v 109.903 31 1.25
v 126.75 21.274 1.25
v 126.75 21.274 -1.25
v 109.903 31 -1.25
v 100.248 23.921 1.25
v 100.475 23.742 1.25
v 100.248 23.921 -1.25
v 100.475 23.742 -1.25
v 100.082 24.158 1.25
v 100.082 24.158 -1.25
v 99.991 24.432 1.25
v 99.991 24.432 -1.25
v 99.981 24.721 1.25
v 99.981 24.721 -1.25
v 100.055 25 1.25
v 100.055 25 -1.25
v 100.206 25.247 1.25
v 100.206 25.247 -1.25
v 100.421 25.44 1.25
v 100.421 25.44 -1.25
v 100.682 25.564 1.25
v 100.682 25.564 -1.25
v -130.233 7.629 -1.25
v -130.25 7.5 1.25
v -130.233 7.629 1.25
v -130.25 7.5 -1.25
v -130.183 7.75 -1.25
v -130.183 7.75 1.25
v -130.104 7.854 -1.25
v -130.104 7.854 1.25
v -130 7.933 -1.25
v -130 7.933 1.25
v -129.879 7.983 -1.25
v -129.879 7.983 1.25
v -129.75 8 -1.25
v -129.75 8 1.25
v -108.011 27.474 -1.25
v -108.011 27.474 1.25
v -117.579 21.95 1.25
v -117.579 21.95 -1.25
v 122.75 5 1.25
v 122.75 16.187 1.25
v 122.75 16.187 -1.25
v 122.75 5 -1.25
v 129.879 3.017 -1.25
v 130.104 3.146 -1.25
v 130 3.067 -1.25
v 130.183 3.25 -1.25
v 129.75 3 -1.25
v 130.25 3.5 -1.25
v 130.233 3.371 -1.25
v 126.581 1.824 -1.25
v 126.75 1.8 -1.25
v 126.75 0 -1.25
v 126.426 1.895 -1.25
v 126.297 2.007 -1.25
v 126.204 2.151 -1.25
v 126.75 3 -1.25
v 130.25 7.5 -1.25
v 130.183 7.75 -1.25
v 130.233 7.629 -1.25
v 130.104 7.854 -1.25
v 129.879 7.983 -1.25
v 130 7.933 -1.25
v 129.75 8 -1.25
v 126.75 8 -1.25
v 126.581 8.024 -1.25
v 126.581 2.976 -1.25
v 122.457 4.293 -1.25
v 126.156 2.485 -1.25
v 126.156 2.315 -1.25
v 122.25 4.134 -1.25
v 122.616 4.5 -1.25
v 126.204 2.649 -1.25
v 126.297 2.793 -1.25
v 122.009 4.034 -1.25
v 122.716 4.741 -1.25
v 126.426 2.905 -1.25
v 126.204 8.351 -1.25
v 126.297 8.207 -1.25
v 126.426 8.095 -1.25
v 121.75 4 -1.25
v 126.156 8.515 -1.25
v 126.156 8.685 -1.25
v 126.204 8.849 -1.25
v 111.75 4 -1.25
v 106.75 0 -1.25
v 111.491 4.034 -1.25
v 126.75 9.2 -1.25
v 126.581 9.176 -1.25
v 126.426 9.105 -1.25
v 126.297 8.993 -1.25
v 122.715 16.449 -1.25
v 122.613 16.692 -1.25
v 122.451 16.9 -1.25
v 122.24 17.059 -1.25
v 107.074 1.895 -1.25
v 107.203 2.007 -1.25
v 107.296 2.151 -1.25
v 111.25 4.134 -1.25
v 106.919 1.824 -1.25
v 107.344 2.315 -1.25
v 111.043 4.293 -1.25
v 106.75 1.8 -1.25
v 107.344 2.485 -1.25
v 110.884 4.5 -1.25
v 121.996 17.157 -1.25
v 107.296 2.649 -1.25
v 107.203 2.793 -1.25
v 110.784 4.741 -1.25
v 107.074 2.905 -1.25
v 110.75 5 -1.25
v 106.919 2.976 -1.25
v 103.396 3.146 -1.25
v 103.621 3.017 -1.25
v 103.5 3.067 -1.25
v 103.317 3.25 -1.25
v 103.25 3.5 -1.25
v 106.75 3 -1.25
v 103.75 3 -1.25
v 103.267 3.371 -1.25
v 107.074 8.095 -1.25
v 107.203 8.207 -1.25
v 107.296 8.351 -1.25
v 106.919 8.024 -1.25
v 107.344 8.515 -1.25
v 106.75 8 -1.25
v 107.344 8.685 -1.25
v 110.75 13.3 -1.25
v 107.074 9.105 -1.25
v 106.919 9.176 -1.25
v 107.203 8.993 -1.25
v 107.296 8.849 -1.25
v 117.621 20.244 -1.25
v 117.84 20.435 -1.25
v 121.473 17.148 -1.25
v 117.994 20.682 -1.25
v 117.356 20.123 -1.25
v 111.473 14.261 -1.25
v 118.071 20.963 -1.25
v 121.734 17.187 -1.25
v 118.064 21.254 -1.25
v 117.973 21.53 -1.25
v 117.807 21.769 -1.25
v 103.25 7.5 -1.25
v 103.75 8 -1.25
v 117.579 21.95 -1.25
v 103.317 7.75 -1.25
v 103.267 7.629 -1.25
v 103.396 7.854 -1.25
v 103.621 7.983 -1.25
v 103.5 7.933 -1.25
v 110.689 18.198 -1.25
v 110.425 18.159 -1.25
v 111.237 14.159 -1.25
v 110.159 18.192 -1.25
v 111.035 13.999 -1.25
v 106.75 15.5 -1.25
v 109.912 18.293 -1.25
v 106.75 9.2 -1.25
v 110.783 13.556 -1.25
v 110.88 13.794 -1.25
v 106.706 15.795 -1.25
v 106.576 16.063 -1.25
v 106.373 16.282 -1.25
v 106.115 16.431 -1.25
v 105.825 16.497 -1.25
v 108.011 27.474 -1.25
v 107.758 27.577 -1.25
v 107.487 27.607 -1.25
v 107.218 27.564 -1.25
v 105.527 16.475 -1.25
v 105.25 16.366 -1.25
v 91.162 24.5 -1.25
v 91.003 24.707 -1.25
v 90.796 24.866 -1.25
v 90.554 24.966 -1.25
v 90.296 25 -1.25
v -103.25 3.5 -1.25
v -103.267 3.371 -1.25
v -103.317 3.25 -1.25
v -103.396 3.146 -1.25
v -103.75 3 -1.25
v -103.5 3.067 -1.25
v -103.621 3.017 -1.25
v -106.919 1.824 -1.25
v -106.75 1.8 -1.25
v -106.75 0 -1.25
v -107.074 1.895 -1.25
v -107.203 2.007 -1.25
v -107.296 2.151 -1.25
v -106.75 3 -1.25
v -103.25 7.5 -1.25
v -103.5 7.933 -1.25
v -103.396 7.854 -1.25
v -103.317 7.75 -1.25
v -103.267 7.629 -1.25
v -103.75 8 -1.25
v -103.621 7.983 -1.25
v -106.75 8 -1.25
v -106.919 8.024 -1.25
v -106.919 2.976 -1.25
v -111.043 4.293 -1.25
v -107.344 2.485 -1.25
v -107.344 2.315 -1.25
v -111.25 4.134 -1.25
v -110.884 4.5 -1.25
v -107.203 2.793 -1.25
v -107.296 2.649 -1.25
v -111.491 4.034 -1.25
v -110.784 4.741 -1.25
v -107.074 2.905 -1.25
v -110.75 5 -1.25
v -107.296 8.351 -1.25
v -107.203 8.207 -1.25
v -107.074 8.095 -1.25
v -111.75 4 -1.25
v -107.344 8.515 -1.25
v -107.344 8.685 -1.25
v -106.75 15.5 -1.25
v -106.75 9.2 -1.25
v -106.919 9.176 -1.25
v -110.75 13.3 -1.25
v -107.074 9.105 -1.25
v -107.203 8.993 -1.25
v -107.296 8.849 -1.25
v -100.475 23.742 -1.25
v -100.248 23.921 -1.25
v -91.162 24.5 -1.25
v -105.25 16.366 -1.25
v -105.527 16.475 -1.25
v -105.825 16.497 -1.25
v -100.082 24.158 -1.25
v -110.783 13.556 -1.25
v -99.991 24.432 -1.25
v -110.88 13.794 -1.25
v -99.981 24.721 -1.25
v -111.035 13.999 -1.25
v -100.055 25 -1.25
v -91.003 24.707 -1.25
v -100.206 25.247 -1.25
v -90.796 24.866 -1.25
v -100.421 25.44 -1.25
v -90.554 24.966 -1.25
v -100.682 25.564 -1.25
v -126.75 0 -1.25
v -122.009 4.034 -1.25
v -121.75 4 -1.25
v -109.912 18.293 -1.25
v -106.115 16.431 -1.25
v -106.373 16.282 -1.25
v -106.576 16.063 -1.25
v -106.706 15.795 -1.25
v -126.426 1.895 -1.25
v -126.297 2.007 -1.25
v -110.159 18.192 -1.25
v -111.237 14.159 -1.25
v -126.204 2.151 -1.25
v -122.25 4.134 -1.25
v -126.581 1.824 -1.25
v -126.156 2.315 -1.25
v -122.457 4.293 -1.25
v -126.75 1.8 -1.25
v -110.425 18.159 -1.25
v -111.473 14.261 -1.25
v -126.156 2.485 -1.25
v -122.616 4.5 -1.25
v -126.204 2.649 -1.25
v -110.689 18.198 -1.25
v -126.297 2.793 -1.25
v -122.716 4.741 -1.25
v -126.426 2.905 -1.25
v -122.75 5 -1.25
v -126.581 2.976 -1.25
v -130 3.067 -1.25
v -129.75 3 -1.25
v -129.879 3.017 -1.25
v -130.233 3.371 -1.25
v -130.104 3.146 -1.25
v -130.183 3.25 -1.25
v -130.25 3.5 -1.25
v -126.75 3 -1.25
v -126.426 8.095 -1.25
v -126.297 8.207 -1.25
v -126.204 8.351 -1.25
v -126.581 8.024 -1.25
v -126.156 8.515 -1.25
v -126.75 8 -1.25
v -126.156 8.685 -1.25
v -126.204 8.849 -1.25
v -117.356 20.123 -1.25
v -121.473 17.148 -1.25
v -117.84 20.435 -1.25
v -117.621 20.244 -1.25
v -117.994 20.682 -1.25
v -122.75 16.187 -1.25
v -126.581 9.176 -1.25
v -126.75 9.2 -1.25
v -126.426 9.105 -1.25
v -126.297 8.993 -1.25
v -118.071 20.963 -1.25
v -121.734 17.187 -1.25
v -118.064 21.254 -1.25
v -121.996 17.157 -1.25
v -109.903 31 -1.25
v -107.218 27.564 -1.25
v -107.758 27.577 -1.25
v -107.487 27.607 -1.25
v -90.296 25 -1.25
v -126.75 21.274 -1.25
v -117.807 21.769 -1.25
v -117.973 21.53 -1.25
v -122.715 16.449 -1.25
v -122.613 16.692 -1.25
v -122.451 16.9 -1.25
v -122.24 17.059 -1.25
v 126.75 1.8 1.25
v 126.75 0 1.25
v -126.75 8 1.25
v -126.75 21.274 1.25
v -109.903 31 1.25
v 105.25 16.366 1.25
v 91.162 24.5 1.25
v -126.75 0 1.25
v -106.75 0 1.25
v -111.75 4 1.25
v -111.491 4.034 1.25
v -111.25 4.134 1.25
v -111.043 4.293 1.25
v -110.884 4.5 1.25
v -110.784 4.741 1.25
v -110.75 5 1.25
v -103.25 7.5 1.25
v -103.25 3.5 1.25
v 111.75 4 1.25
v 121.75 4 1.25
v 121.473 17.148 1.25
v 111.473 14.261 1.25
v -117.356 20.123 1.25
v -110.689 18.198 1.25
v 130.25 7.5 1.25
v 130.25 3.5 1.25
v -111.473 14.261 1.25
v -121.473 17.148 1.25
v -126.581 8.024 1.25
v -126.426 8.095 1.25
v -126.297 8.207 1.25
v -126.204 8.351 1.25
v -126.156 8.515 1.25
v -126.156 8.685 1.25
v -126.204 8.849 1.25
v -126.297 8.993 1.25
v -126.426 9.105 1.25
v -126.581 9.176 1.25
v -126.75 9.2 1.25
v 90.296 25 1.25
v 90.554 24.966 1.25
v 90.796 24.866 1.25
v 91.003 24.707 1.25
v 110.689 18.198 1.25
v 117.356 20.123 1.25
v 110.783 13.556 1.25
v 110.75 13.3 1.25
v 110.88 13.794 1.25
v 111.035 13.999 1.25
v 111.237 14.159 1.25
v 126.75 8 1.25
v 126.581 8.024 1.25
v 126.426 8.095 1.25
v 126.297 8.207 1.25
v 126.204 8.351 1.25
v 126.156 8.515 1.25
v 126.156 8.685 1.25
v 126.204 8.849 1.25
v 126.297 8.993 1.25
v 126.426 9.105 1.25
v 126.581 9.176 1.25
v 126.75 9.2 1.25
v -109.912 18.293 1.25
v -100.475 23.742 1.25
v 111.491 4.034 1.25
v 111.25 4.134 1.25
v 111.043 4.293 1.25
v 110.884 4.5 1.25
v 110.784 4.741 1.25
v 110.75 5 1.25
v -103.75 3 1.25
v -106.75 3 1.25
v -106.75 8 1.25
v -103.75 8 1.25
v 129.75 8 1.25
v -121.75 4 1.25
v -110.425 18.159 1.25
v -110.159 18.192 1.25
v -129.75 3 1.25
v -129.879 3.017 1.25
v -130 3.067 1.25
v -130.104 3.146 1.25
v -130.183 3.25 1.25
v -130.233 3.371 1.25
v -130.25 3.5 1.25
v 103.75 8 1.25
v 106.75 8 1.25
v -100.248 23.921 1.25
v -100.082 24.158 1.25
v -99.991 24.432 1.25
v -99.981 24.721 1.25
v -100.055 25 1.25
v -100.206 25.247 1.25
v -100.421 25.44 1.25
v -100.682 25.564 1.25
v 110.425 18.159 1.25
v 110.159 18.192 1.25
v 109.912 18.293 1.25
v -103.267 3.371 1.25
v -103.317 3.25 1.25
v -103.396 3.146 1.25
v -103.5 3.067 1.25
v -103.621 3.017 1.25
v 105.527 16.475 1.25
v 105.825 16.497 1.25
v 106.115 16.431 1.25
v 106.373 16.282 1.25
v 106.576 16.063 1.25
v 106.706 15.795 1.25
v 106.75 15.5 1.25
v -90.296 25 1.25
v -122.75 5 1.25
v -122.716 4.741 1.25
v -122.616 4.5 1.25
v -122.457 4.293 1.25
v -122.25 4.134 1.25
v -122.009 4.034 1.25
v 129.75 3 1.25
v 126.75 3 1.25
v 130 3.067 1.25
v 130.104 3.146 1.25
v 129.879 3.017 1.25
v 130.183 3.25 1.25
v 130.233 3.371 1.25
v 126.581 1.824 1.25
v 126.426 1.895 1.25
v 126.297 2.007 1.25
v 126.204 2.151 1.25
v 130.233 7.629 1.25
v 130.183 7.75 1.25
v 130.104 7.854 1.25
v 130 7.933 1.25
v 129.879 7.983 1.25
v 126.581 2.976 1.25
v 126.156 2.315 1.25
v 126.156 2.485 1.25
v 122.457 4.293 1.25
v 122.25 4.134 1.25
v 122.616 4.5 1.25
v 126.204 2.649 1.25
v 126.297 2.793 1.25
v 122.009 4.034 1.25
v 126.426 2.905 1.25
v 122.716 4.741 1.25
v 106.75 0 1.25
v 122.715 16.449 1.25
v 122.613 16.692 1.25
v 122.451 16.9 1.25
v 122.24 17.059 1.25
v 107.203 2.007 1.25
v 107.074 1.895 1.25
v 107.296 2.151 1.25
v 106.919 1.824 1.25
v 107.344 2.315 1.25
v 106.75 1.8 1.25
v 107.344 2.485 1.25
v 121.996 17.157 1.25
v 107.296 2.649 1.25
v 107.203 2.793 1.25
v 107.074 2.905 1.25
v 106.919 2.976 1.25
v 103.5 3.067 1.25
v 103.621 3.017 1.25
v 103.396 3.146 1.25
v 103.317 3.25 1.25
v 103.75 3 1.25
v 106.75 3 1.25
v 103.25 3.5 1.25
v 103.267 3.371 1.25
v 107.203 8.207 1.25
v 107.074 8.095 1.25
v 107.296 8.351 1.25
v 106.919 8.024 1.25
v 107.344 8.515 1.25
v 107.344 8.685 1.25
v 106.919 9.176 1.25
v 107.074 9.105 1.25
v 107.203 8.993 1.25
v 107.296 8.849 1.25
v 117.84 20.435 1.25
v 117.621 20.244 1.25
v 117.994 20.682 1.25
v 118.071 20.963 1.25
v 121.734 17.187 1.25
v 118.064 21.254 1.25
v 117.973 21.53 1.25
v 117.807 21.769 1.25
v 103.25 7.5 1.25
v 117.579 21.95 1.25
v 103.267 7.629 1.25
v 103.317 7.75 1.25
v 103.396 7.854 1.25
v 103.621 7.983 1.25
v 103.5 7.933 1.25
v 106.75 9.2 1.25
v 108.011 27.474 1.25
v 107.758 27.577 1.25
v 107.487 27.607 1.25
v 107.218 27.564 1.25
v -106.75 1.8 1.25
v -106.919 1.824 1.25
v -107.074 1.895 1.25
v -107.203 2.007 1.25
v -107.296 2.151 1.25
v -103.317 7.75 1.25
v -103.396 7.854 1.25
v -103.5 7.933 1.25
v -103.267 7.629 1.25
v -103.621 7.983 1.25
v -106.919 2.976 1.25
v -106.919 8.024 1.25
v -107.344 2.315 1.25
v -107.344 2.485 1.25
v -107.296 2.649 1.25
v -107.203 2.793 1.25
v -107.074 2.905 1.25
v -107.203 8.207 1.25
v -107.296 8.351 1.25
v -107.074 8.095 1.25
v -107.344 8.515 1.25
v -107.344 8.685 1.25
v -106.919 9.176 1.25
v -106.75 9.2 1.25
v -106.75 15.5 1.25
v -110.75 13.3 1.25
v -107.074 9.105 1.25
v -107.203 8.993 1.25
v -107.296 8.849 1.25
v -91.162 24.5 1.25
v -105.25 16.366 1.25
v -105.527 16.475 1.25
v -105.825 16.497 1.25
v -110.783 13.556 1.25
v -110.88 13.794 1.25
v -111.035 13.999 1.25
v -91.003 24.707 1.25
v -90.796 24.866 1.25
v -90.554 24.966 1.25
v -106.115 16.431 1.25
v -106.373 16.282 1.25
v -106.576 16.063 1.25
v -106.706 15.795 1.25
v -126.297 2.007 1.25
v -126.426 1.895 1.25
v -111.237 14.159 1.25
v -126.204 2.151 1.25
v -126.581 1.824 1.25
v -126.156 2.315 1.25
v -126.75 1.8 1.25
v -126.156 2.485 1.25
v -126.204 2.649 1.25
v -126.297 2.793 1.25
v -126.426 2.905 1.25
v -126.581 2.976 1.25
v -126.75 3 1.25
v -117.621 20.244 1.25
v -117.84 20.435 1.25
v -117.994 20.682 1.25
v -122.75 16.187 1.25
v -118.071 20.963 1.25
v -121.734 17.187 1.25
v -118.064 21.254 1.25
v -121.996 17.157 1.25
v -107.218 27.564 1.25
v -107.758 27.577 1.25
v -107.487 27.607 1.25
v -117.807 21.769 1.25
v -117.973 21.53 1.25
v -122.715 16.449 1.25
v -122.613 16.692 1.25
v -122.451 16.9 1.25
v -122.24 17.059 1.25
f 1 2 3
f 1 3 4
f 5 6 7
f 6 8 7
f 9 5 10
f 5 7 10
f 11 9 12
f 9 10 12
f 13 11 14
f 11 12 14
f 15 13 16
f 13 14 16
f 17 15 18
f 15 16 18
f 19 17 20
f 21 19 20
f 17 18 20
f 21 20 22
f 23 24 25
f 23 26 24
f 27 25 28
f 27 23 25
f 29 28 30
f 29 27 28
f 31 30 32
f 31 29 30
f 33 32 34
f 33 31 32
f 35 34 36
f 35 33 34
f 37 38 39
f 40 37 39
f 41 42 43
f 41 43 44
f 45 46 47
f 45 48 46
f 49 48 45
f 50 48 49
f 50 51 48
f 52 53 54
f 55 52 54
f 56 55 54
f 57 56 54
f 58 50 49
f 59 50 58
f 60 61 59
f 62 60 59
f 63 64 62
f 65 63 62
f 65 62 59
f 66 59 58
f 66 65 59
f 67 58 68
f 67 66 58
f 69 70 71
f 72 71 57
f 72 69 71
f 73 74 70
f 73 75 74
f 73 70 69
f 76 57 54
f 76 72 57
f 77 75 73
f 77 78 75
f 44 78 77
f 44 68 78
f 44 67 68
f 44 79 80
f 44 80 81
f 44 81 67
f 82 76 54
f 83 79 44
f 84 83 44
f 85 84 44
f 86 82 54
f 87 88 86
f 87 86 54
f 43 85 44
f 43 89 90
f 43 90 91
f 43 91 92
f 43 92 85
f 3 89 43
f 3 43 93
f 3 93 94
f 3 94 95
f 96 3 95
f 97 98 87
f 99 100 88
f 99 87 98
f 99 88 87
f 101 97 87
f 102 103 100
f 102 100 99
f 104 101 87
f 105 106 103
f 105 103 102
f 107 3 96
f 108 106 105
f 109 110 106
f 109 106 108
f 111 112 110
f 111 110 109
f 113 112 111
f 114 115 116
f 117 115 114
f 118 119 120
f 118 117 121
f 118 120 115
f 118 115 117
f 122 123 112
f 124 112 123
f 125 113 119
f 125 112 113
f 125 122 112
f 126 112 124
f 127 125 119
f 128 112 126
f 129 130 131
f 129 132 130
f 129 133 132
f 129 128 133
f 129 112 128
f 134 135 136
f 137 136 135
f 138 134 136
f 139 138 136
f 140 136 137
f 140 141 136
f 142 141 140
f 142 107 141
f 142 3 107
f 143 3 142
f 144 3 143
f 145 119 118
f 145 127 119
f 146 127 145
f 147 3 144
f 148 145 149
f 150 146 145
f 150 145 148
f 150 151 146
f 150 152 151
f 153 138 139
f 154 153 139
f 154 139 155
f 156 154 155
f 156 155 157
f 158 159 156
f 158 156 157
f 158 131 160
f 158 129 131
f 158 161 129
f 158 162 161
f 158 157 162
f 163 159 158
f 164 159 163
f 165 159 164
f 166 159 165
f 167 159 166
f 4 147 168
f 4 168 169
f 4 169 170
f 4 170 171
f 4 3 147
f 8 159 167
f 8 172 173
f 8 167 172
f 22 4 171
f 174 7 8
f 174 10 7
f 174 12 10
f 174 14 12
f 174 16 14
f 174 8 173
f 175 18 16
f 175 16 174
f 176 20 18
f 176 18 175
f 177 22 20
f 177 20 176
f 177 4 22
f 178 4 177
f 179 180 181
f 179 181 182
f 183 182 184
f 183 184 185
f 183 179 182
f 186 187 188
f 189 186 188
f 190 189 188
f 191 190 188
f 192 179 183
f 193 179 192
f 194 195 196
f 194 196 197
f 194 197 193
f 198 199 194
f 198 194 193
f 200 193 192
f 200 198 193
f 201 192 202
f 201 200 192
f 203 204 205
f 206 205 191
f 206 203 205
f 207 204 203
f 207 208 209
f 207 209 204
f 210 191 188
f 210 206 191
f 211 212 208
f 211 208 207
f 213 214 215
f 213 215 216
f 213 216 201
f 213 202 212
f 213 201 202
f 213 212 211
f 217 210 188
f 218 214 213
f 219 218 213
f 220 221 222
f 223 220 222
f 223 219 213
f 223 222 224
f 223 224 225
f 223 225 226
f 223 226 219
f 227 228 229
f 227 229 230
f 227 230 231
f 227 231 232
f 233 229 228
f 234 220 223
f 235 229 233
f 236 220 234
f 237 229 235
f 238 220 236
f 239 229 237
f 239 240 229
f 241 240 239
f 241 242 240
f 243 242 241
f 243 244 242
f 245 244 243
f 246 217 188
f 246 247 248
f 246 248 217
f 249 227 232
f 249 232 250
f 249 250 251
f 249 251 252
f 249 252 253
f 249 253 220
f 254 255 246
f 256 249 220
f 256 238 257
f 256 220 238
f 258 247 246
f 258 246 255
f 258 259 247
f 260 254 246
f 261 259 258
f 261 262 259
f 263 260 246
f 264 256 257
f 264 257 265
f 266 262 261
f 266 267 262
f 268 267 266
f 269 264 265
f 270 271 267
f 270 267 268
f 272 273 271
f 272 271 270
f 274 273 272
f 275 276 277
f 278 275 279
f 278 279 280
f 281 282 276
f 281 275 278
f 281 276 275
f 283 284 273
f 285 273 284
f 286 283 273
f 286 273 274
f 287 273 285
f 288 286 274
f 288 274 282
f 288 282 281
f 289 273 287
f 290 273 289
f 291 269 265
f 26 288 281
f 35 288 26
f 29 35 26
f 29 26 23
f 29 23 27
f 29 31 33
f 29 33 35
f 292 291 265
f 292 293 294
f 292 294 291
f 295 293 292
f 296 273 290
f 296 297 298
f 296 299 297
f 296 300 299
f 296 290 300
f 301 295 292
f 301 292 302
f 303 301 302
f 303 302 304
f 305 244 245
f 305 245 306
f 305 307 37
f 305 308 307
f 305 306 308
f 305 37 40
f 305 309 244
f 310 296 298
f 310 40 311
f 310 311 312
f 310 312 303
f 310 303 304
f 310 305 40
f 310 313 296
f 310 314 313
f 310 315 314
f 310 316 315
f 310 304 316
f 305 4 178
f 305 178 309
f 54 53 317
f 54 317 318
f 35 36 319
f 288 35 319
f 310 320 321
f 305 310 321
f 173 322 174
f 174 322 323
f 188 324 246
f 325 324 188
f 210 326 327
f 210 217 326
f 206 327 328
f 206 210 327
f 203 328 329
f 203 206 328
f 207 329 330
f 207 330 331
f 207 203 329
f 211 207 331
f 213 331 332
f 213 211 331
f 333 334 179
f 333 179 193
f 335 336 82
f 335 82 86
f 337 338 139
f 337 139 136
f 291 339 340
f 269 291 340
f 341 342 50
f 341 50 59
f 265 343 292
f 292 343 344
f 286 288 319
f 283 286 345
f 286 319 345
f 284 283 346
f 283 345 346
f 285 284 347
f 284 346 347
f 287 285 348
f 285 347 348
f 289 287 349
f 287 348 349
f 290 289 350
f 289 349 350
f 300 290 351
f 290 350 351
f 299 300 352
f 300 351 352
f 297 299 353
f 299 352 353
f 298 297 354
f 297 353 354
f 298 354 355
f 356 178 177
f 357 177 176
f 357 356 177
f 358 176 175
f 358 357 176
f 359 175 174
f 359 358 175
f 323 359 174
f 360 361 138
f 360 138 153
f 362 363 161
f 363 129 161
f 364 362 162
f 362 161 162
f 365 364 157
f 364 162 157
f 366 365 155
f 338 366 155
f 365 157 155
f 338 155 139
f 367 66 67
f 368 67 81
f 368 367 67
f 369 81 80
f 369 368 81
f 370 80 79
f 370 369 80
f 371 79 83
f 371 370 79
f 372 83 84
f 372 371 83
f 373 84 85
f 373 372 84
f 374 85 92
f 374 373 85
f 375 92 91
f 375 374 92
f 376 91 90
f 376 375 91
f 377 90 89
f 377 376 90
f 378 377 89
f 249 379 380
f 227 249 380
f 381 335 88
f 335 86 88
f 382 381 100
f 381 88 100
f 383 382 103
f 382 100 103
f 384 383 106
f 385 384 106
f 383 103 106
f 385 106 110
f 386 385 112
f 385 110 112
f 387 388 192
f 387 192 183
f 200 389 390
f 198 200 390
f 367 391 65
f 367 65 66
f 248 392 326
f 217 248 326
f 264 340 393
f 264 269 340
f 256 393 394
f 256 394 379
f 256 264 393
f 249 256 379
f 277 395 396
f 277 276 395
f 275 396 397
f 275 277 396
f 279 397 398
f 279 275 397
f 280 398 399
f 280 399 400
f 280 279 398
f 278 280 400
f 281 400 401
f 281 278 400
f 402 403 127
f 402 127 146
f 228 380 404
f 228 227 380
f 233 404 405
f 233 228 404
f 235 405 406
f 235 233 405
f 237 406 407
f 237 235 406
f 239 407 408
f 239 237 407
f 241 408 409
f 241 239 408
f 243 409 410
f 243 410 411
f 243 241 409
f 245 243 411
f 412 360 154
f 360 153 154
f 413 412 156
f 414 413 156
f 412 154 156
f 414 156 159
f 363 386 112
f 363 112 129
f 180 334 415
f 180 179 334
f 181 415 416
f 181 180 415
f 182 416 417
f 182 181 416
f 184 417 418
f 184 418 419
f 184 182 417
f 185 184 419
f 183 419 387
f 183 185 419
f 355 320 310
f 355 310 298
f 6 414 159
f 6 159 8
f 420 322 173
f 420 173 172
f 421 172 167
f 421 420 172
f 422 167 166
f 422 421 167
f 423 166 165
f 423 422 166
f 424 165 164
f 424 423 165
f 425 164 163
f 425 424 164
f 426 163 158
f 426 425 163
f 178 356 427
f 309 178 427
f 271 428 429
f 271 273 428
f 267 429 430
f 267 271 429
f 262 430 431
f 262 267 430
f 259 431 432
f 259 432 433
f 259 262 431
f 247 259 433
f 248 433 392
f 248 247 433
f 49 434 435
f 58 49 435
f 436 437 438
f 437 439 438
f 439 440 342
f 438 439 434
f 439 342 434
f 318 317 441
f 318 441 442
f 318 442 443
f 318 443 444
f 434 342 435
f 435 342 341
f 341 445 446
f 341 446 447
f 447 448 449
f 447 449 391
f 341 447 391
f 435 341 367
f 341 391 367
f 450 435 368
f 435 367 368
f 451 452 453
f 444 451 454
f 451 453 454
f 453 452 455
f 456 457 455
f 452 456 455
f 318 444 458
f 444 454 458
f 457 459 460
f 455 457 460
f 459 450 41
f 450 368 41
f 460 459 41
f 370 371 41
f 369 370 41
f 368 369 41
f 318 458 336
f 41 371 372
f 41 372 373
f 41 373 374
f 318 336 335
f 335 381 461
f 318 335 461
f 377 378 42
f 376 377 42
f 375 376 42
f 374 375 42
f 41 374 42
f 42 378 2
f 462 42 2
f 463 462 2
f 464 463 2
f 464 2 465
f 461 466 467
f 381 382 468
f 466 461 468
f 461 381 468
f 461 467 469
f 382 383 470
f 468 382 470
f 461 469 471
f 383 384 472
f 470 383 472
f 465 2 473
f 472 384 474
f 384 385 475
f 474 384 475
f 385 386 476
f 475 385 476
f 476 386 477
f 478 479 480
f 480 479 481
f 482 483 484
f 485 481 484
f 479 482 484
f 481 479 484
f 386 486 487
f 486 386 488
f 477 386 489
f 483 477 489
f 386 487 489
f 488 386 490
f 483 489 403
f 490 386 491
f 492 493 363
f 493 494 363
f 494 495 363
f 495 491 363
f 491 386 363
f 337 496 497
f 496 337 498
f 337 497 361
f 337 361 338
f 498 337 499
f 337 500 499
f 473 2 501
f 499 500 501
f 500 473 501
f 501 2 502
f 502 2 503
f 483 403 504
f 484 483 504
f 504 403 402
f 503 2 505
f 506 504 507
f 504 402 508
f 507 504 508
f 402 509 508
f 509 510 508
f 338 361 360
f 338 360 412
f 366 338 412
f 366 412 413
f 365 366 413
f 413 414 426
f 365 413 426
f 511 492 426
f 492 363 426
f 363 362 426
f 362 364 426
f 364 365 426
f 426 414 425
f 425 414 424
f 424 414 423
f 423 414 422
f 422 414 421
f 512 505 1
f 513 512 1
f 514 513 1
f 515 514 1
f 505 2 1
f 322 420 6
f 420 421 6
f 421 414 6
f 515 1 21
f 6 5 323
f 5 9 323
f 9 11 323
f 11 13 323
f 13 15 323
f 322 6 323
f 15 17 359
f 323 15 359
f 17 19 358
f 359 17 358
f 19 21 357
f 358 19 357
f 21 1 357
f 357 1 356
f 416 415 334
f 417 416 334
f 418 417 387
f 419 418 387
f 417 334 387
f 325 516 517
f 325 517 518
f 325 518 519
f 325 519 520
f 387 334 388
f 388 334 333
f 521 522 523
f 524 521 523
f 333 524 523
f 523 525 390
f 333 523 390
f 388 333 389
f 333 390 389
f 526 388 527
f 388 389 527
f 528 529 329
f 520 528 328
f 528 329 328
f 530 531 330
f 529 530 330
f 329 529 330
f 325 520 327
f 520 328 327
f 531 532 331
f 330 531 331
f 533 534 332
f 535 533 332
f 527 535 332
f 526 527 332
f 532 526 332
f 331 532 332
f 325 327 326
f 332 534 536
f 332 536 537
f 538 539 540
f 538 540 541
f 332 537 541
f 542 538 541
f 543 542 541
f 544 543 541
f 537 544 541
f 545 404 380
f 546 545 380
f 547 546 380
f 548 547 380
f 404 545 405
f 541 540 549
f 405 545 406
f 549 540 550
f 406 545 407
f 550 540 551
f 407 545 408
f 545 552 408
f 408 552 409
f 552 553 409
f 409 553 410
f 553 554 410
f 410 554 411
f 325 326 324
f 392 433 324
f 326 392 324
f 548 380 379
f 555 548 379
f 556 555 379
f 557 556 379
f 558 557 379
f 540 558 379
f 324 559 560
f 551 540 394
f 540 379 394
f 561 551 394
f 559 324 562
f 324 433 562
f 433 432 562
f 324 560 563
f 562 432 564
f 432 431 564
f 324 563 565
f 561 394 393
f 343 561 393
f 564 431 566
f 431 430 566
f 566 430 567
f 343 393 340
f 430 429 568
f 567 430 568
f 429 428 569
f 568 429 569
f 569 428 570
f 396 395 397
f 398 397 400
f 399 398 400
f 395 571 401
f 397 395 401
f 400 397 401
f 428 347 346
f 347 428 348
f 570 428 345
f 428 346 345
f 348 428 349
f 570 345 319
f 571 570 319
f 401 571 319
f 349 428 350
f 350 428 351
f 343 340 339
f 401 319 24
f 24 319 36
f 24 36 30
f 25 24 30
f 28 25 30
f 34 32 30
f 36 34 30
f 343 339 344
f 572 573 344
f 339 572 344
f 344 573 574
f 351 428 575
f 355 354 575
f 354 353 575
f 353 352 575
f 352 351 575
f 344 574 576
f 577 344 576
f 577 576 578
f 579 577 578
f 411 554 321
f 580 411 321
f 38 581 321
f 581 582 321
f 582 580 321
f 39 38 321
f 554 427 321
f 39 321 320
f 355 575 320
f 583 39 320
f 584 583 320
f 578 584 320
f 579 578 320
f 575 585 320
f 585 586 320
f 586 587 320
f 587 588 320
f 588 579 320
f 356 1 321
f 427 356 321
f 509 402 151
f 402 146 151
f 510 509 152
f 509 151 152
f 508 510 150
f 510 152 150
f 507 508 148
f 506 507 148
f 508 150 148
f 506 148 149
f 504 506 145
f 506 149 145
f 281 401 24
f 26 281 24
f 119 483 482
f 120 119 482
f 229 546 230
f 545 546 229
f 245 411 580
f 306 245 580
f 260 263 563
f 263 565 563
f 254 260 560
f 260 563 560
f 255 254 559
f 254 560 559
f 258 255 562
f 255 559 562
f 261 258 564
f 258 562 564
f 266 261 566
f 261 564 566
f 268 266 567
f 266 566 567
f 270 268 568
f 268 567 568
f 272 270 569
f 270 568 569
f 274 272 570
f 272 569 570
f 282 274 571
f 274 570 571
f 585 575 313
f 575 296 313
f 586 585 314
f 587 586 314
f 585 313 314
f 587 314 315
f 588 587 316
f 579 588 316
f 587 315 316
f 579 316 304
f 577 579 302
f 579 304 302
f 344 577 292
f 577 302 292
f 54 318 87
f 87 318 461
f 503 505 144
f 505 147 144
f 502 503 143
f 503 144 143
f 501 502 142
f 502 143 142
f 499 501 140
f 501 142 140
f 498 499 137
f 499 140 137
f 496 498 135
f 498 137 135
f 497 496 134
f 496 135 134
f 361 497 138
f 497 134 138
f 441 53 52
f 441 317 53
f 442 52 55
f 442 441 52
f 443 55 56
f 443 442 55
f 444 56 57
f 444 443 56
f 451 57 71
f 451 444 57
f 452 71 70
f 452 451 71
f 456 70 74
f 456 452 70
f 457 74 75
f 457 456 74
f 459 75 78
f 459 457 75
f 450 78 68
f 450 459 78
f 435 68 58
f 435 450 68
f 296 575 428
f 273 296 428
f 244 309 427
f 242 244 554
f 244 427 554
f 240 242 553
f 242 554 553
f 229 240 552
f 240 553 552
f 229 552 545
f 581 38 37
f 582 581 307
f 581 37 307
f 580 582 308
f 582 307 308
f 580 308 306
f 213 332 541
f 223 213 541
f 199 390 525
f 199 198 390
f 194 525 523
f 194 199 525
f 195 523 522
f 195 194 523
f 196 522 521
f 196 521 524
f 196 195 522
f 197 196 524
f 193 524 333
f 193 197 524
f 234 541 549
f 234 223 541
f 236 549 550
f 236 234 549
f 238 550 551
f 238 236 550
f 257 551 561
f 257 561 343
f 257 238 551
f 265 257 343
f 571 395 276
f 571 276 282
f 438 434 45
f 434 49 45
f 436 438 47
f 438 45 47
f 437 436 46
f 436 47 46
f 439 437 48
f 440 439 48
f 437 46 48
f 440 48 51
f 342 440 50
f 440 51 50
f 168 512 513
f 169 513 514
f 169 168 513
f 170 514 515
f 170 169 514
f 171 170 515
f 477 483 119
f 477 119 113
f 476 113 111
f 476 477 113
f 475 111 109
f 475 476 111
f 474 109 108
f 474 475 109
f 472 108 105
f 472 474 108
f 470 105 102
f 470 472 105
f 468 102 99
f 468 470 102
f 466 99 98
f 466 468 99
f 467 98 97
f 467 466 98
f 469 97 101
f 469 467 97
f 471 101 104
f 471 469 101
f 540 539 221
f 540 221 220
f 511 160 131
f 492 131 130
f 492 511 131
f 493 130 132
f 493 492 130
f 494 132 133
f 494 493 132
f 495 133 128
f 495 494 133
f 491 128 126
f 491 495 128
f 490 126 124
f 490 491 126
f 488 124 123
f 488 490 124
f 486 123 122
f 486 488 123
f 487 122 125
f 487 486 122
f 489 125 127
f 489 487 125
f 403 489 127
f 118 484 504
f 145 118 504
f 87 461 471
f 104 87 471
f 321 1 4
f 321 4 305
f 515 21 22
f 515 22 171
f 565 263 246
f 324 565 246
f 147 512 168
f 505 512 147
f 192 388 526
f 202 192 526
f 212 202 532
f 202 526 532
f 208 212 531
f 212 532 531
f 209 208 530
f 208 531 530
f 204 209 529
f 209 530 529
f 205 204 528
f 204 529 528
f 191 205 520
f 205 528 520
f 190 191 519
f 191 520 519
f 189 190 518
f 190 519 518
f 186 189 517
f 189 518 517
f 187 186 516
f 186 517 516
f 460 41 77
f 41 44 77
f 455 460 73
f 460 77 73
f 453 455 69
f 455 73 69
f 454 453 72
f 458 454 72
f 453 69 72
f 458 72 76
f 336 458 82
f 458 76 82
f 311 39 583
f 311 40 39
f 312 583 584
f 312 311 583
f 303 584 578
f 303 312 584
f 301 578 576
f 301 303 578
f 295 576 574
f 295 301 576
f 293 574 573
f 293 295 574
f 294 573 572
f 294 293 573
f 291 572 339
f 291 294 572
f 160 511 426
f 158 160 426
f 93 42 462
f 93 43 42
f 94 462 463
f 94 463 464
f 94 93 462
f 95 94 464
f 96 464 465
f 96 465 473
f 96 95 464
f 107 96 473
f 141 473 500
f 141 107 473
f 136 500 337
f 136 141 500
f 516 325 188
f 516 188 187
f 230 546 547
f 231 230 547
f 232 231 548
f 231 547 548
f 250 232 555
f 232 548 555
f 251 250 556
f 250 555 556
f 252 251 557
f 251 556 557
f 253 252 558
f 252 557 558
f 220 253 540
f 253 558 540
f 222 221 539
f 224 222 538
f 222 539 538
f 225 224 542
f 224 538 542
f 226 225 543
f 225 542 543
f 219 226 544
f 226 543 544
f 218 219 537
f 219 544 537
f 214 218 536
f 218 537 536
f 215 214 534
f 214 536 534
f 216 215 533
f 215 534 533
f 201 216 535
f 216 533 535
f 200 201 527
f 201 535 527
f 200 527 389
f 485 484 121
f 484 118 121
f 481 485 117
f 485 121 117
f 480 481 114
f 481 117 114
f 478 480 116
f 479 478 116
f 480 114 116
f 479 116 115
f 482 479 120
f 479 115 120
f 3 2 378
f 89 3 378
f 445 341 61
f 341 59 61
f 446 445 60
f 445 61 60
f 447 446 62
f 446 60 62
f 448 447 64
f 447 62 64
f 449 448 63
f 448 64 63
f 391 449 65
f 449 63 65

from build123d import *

# Parameters (mm, degrees)
EXTRUDE_1_DEPTH     = 1.25
SKETCH_2_W          = 3.5
SKETCH_2_H          = 5
EXTRUDE_2_DEPTH     = 2.5
SKETCH_3_R          = 0.6
CUT_EXTRUDE_1_DEPTH = 3.5
FILLET_1_R          = 0.5
CUT_EXTRUDE_3_DEPTH = 3.5
CUT_EXTRUDE_5_DEPTH = 3.5
CUT_EXTRUDE_6_DEPTH = 3.5
FILLET_4_R          = 1
SKETCH_12_R         = 1
CUT_EXTRUDE_7_DEPTH = 3.5
SKETCH_13_W         = 157.663481756
SKETCH_13_H         = 52.44668755
CUT_EXTRUDE_8_DEPTH = 3.5


with BuildPart() as part:
    # 草图1 → 凸台-拉伸1 (new body, symmetric)
    with BuildSketch(Plane.XY):
        Polygon((-126.75, 40), (-126.75, 0), (-106.75, 0), (-106.75, 15.5), (-90.295517328, 25), (101.265172443, 25), (106.75, 15.5), (106.75, 0), (126.75, 0), (126.75, 40), align=None)
    extrude(amount=EXTRUDE_1_DEPTH, both=True)

    # 草图2 → 凸台-拉伸2 (add)
    with BuildSketch(Plane.XY.offset(1.25)):
        with Locations((-105, 5.5)):
            Rectangle(SKETCH_2_W, SKETCH_2_H)
        with Locations((105, 5.5)):
            Rectangle(SKETCH_2_W, SKETCH_2_H)
        with Locations((-128.5, 5.5)):
            Rectangle(SKETCH_2_W, SKETCH_2_H)
        with Locations((128.5, 5.5)):
            Rectangle(SKETCH_2_W, SKETCH_2_H)
    extrude(amount=-EXTRUDE_2_DEPTH)

    # 草图3 → 切除-拉伸1 (cut, through all)
    with BuildSketch(Plane.XY.offset(1.25)):
        with Locations((-106.75, 8.6)):
            Circle(SKETCH_3_R)
        with Locations((-106.75, 2.4)):
            Circle(SKETCH_3_R)
        with Locations((106.75, 8.6)):
            Circle(SKETCH_3_R)
        with Locations((106.75, 2.4)):
            Circle(SKETCH_3_R)
        with Locations((-126.75, 8.6)):
            Circle(SKETCH_3_R)
        with Locations((-126.75, 2.4)):
            Circle(SKETCH_3_R)
        with Locations((126.75, 8.6)):
            Circle(SKETCH_3_R)
        with Locations((126.75, 2.4)):
            Circle(SKETCH_3_R)
    extrude(amount=-CUT_EXTRUDE_1_DEPTH, mode=Mode.SUBTRACT)

    # 圆角1
    fillet_1_edges = [part.edges().sort_by_distance(p)[0] for p in [
        (-103.25, 8, 0),
        (-103.25, 3, 0),
        (103.25, 3, 0),
        (103.25, 8, 0),
        (-130.25, 3, 0),
        (-130.25, 8, 0),
        (130.25, 8, 0),
        (130.25, 3, 0),
    ]]
    fillet(fillet_1_edges, radius=FILLET_1_R)

    # 草图7 → 切除-拉伸3 (cut, through all)
    with BuildSketch(Plane.XY.offset(1.25)):
        Polygon((-126.75, 21.273502692), (-94.314755215, 40), (-126.75, 40), align=None)
        Polygon((109.925426481, 40), (126.75, 40), (126.75, 10.858983849), align=None)
    extrude(amount=-CUT_EXTRUDE_3_DEPTH, mode=Mode.SUBTRACT)

    # 草图10 → 切除-拉伸5 (cut, through all)
    with BuildSketch(Plane.XY.offset(1.25)):
        Polygon((-109.903212483, 31), (59.199644147, 31), (69.925426481, 40), (-94.314755215, 40), align=None)
    extrude(amount=-CUT_EXTRUDE_5_DEPTH, mode=Mode.SUBTRACT)

    # 草图11 → 切除-拉伸6 (cut, through all)
    with BuildSketch(Plane.XY.offset(1.25)):
        Polygon((-107.634159118, 27.691236417), (-119.613891029, 20.774734974), (-110.280557696, 18.080433718), (-98.483901379, 24.891236417), align=None)
        Polygon((-122.75, 17.516719654), (-122.75, 4), (-110.75, 4), (-110.75, 14.052618039), align=None)
        Polygon((122.75, 10.247330901), (122.75, 4), (110.75, 4), (110.75, 13.031940592), align=None)
    extrude(amount=-CUT_EXTRUDE_6_DEPTH, mode=Mode.SUBTRACT)

    # 圆角4
    fillet_4_edges = [part.edges().sort_by_distance(p)[0] for p in [
        (-107.634159118, 27.691236417, 0),
        (-98.483901379, 24.891236417, 0),
        (-110.280557696, 18.080433718, 0),
        (-119.613891029, 20.774734974, 0),
        (-110.75, 4, 0),
        (-122.75, 4, 0),
        (-122.75, 17.516719654, 0),
        (-110.75, 14.052618039, 0),
        (122.75, 4, 0),
        (110.75, 4, 0),
        (110.75, 13.031940592, 0),
        (122.75, 10.247330901, 0),
    ]]
    fillet(fillet_4_edges, radius=FILLET_4_R)

    # 草图12 → 切除-拉伸7 (cut, through all)
    with BuildSketch(Plane.XY.offset(1.25)):
        with Locations((-90.295517328, 24)):
            Circle(SKETCH_12_R)
        with Locations((-105.75, 15.5)):
            Circle(SKETCH_12_R)
        with Locations((59.199644147, 32)):
            Circle(SKETCH_12_R)
        with Locations((101.265172443, 24)):
            Circle(SKETCH_12_R)
        with Locations((105.75, 15.5)):
            Circle(SKETCH_12_R)
    extrude(amount=-CUT_EXTRUDE_7_DEPTH, mode=Mode.SUBTRACT)

    # 草图13 → 切除-拉伸8 (cut, through all)
    with BuildSketch(Plane.XY.offset(1.25)):
        with Locations((78.831740878, 26.223343775)):
            Rectangle(SKETCH_13_W, SKETCH_13_H)
    extrude(amount=-CUT_EXTRUDE_8_DEPTH, mode=Mode.SUBTRACT)

    # 镜向2: part across plane


with BuildPart() as part_1:
    add(part.part)
    add(part.part.mirror(Plane(origin=(0, 52.44668755, -1.25), x_dir=(0, 0, 1), z_dir=(-1, 0, 0))))


solid = part_1.part
